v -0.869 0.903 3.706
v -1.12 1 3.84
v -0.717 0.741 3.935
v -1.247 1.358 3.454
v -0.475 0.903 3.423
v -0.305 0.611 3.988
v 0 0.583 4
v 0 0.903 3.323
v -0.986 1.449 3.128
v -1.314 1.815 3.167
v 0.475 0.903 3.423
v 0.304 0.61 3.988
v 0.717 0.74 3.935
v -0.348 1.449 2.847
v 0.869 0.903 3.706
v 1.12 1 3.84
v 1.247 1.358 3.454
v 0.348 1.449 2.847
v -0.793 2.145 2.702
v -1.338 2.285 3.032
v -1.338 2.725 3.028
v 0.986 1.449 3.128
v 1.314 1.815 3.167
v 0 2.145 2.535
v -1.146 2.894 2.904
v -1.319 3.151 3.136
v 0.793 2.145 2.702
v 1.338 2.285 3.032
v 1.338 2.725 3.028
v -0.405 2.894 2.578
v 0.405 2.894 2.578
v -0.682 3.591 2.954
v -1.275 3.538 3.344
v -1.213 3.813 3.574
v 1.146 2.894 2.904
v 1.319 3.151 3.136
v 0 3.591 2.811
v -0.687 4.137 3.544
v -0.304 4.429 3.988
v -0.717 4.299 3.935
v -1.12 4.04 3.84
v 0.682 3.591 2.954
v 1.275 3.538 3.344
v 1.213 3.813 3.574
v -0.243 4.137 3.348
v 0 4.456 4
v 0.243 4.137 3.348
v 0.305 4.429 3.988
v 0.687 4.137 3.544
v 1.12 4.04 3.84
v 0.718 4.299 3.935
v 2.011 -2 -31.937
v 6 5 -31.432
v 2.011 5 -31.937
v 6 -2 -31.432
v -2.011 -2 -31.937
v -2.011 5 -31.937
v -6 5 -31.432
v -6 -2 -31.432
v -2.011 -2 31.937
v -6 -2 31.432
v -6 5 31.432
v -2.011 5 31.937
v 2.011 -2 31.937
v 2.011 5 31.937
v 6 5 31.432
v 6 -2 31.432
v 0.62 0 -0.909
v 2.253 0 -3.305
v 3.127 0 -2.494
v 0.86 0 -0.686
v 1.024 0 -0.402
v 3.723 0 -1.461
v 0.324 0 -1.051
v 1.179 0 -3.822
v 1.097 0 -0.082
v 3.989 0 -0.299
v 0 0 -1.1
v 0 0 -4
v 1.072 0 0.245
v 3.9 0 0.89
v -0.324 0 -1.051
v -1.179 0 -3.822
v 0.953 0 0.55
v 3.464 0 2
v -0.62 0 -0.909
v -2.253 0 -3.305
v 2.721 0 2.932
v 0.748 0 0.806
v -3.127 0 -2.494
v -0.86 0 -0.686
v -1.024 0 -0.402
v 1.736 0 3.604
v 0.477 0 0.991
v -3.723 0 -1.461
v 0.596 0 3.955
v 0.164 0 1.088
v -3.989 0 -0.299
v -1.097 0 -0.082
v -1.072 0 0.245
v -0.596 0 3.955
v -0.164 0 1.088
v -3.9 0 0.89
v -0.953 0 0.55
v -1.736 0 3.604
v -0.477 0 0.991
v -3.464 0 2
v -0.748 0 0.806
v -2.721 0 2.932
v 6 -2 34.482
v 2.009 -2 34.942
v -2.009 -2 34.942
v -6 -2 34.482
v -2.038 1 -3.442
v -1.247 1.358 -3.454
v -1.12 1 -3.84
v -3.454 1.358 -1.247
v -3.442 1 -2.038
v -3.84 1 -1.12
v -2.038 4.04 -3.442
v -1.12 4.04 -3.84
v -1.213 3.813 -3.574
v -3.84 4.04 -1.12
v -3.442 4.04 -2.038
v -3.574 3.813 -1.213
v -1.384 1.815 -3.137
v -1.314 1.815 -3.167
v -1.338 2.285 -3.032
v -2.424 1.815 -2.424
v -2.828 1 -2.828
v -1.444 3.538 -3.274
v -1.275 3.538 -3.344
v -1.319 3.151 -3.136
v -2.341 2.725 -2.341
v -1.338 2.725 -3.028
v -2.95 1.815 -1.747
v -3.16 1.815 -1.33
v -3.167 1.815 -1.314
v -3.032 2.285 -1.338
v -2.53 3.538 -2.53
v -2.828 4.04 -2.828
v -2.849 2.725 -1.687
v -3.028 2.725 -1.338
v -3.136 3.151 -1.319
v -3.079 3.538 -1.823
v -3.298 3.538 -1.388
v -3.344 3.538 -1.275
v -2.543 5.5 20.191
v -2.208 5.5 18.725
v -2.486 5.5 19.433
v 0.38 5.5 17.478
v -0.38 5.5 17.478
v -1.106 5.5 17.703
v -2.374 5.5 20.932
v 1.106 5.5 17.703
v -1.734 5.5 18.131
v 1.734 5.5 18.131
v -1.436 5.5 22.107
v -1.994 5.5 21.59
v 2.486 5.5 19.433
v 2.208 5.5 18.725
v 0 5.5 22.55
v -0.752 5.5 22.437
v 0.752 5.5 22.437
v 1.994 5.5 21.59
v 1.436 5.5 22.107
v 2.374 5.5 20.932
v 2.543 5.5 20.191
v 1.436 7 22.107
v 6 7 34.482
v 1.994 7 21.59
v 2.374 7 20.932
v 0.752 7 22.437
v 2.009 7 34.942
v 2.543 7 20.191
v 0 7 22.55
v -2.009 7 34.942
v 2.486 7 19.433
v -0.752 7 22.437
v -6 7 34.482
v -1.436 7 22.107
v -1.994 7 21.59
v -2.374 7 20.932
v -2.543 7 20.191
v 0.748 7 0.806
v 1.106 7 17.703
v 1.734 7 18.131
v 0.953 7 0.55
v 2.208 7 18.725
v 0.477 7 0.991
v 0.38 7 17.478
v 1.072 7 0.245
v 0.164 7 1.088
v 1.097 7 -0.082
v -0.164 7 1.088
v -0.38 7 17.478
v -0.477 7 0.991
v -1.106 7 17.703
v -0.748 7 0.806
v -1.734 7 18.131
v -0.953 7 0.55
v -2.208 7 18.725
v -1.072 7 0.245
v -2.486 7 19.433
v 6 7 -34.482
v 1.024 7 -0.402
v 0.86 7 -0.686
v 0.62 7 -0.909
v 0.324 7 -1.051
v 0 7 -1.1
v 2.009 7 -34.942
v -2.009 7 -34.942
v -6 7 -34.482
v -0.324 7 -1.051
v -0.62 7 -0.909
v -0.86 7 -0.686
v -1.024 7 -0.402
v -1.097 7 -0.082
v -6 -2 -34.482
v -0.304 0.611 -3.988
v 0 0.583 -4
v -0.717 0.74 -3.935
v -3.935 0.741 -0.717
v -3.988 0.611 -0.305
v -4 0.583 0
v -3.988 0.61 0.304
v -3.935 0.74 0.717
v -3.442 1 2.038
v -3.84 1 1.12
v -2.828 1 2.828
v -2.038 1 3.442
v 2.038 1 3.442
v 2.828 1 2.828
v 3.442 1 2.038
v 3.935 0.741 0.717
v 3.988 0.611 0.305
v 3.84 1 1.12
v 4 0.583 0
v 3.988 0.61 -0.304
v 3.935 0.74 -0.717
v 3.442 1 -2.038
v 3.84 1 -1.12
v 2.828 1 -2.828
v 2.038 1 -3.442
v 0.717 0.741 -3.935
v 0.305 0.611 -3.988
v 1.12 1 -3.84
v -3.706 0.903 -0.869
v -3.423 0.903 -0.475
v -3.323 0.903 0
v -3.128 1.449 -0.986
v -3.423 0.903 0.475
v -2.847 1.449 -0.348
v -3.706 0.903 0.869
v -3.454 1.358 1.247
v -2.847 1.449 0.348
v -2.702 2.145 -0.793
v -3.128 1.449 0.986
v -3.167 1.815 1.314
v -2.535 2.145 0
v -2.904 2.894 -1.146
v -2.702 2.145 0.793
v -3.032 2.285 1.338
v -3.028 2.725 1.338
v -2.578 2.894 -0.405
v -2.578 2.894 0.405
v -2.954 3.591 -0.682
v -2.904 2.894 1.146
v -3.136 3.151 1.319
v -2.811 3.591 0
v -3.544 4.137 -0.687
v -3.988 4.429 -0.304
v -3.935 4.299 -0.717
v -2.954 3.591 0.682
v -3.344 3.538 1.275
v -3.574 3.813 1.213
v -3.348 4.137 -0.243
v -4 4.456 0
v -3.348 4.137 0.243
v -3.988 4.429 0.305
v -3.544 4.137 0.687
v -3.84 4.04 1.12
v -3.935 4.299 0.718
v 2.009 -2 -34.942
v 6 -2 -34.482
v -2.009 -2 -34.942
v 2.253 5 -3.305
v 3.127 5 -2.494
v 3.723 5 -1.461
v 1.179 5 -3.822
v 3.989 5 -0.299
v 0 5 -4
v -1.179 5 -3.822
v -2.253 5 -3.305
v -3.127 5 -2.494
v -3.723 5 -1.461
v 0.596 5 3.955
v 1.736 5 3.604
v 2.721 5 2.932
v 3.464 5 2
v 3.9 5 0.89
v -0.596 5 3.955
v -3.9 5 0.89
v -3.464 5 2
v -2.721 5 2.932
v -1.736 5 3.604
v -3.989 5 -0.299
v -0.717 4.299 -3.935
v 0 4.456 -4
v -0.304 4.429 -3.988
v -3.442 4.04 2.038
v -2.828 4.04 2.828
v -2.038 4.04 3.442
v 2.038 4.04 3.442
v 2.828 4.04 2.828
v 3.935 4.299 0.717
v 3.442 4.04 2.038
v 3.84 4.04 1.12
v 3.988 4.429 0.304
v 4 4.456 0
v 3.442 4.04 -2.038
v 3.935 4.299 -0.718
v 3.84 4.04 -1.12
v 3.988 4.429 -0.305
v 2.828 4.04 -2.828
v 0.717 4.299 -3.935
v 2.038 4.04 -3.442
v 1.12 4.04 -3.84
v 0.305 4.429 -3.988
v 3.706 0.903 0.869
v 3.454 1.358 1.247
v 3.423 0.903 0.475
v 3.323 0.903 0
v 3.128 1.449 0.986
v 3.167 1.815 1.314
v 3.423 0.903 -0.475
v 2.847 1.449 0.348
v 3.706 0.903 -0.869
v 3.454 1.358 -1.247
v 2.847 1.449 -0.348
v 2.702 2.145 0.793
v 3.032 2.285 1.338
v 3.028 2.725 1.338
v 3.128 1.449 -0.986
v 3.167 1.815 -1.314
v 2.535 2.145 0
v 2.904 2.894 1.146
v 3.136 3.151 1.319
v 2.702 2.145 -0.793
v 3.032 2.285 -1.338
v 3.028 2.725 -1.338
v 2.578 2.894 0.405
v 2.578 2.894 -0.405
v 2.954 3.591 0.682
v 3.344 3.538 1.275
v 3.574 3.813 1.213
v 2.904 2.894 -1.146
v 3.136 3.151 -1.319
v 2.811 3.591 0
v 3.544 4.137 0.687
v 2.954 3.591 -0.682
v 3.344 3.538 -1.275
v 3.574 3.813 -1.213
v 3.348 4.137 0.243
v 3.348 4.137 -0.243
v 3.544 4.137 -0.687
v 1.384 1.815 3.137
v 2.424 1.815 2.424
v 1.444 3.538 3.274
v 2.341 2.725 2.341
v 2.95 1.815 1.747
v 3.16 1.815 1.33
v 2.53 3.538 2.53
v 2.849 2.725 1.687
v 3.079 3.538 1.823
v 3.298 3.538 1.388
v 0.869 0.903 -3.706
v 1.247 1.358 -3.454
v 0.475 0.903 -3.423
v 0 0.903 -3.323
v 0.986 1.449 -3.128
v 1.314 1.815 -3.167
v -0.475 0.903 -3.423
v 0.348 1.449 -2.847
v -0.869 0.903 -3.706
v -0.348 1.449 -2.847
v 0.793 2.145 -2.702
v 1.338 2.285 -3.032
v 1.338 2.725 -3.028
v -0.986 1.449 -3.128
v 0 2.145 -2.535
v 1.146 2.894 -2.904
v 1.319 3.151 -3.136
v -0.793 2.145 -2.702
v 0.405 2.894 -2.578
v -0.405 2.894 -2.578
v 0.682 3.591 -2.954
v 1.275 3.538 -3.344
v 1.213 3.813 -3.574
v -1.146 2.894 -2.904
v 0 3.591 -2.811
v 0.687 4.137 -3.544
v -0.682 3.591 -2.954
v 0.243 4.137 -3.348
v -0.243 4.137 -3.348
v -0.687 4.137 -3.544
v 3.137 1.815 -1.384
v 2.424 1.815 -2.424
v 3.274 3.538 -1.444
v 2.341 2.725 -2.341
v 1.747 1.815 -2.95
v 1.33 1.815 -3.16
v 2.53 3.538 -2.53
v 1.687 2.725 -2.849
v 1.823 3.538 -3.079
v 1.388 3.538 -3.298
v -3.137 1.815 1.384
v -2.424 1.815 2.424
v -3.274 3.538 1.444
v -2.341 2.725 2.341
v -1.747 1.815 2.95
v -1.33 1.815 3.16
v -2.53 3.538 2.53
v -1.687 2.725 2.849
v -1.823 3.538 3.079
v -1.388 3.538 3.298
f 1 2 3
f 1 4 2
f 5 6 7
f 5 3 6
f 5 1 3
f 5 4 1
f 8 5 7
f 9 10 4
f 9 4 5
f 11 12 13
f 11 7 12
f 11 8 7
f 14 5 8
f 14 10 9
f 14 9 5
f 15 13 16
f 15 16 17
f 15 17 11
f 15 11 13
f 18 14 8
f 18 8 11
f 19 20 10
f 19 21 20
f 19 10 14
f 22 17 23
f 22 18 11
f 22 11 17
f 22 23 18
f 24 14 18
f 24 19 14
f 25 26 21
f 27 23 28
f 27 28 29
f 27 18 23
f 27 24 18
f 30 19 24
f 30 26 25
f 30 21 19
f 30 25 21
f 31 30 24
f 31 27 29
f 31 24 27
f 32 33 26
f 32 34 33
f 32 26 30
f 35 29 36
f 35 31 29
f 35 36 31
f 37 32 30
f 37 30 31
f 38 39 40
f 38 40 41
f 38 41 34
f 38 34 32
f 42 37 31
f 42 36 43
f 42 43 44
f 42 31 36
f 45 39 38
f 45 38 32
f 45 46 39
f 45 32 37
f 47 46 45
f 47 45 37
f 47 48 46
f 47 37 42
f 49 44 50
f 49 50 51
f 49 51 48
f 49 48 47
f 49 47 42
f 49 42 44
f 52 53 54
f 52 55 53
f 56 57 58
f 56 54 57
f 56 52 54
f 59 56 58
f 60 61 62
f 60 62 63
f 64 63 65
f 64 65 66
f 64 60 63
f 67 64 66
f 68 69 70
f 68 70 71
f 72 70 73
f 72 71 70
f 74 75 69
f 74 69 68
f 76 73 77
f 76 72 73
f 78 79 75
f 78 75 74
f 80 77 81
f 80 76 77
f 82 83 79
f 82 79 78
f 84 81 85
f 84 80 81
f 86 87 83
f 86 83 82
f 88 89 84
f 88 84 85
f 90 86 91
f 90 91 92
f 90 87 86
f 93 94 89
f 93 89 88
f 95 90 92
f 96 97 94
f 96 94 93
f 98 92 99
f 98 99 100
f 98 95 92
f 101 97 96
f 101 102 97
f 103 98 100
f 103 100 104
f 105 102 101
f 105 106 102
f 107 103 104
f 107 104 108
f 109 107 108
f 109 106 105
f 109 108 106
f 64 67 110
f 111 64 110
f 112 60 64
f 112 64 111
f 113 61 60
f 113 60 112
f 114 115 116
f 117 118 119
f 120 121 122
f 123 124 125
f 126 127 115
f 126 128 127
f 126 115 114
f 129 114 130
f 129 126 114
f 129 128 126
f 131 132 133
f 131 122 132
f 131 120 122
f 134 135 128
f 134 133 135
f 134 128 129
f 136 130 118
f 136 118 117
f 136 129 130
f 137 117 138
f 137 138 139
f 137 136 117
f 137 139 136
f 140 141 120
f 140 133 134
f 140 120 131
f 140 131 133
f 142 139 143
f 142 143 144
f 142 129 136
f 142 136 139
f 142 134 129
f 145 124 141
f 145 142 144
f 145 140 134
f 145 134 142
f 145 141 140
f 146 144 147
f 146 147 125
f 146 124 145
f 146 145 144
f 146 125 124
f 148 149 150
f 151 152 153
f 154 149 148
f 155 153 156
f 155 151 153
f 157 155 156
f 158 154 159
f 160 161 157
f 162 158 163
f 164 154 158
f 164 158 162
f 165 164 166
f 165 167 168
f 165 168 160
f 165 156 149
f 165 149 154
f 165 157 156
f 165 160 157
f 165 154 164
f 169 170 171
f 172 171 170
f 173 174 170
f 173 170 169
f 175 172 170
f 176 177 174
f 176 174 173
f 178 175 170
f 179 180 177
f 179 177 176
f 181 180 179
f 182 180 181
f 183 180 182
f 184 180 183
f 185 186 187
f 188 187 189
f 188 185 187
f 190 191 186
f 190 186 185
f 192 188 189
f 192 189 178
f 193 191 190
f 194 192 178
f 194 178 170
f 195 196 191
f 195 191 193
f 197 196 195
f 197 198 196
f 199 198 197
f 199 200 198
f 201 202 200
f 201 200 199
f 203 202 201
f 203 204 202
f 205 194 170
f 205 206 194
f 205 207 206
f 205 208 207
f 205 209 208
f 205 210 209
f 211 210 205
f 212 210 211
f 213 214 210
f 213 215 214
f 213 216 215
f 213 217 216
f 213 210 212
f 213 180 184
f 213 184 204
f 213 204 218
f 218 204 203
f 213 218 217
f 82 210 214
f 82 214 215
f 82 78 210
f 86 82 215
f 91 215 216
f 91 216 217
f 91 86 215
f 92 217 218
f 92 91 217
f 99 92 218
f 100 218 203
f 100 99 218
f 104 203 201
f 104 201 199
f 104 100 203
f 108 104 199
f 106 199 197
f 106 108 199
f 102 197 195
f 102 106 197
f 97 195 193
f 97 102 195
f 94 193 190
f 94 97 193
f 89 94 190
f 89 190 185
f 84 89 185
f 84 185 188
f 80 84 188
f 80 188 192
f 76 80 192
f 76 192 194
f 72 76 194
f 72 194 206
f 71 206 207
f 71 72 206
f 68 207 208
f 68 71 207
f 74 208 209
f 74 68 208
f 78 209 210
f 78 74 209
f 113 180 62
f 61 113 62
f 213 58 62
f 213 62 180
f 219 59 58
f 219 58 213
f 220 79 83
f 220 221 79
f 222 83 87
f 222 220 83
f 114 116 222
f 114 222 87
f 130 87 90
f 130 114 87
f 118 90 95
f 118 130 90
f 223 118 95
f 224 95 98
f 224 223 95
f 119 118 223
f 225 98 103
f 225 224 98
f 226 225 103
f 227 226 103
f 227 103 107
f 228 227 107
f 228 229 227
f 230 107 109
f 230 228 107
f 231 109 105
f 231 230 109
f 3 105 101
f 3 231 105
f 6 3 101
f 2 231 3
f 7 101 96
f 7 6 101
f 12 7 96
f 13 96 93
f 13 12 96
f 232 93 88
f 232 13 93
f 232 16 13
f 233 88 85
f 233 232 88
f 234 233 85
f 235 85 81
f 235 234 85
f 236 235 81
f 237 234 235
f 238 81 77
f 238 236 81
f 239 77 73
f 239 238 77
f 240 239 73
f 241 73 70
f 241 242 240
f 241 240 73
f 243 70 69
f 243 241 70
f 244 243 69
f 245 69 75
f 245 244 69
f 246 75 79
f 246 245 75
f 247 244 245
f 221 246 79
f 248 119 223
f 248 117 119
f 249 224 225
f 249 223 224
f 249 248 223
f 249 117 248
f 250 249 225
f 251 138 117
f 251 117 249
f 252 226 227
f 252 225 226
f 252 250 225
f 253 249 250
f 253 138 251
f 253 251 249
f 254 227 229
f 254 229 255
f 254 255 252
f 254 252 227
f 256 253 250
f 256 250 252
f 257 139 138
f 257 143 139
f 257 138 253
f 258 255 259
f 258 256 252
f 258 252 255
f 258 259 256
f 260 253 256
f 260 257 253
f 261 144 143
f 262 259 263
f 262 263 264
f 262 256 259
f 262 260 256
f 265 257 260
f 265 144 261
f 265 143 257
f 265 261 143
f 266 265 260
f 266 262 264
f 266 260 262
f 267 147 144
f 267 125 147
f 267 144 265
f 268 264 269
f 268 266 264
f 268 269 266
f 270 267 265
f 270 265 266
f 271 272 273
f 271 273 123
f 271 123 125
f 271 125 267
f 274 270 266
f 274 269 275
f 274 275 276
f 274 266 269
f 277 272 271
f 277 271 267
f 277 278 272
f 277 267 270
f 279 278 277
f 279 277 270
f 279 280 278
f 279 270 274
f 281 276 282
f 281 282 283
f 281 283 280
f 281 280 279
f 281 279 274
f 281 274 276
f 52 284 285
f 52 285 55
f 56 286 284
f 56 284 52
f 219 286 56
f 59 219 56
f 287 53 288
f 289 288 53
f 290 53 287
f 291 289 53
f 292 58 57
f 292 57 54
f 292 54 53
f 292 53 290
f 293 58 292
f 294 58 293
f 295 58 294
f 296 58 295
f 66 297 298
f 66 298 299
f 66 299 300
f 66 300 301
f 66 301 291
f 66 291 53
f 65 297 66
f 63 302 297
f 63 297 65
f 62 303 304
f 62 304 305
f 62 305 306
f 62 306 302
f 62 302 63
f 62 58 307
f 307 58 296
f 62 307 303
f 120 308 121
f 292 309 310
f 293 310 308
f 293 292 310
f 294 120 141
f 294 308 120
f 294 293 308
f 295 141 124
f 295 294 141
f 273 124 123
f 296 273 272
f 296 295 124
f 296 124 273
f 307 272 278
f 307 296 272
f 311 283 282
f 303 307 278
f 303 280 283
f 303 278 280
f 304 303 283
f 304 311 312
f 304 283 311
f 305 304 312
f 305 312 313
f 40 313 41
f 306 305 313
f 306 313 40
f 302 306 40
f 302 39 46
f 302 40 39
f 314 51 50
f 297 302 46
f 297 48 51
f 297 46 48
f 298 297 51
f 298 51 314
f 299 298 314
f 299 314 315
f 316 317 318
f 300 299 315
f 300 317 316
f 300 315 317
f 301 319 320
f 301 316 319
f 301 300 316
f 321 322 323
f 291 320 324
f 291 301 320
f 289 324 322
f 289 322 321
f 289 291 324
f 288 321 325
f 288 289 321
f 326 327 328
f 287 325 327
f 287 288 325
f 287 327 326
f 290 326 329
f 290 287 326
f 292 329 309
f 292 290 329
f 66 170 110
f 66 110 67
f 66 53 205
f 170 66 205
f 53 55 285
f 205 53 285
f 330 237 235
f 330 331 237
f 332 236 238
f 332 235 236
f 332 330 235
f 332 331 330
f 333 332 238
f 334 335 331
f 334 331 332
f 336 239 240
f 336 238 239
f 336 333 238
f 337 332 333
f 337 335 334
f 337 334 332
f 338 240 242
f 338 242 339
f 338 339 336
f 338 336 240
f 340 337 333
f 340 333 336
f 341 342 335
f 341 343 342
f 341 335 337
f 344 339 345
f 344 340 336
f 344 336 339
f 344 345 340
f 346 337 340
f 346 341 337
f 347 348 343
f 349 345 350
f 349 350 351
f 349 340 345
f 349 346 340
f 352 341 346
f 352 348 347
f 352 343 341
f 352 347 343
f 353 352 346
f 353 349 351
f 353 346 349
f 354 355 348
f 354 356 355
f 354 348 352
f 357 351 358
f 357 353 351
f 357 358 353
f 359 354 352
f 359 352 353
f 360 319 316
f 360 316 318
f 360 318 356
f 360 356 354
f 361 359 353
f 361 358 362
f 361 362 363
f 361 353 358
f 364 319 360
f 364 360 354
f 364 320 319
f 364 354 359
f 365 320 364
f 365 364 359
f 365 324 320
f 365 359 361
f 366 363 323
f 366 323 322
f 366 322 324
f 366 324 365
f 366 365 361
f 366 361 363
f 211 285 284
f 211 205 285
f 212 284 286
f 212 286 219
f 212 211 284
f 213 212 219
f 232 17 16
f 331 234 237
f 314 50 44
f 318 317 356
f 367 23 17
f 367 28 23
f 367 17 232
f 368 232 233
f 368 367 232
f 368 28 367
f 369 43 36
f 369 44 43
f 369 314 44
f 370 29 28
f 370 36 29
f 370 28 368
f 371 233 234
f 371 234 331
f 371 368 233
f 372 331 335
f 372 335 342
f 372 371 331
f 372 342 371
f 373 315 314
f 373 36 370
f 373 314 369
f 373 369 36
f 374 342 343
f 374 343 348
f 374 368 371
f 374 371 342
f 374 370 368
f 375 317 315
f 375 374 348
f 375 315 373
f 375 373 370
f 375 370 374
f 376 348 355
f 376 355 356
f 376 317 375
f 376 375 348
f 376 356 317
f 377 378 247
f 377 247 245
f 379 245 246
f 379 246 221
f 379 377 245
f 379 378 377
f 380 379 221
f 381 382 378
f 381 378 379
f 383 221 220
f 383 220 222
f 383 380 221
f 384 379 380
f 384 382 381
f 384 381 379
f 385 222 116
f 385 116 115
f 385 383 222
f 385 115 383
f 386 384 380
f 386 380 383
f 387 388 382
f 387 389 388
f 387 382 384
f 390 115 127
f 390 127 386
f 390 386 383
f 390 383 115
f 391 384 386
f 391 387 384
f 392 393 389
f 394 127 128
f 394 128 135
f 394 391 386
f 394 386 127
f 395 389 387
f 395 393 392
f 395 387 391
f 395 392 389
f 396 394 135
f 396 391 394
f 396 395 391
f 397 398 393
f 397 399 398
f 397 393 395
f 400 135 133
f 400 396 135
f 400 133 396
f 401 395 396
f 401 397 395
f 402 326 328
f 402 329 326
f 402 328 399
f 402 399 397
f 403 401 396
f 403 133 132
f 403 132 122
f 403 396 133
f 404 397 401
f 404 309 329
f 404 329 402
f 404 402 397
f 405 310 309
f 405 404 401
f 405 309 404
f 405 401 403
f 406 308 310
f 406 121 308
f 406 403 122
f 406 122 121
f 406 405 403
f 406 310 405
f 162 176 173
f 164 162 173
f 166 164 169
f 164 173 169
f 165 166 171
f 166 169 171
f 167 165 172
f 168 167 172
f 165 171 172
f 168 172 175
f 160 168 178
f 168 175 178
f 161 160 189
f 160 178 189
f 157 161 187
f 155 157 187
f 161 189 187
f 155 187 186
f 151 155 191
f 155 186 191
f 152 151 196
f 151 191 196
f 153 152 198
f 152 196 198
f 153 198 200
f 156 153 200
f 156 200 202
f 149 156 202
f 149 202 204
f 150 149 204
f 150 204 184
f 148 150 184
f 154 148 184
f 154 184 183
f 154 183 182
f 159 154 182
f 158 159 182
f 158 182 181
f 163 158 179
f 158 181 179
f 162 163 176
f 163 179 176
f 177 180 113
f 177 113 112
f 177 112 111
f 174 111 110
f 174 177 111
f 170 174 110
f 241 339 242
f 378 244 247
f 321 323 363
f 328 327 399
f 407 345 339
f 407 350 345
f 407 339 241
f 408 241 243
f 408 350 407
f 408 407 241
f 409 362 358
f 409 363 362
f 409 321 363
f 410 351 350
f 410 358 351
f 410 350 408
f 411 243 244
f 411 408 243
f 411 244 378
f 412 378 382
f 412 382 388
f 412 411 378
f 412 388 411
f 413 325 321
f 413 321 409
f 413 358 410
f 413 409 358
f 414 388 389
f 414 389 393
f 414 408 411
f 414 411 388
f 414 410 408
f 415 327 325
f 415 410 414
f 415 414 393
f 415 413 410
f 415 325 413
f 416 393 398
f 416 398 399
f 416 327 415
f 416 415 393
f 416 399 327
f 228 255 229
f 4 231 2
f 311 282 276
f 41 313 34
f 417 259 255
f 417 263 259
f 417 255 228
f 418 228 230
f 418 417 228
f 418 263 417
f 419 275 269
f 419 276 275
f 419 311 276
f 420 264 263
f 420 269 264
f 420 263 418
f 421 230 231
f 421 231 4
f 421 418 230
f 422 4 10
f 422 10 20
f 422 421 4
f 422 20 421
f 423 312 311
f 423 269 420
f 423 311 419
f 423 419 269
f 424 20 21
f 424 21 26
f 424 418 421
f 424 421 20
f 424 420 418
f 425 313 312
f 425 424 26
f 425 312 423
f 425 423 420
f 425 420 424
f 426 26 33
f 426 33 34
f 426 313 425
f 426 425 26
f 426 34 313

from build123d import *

# Parameters (mm, degrees)
CORTE_EXTRUS_O1_DEPTH      = 51.309044912
CORTE_EXTRUS_O1_DEPTH_BACK = 51.309044912
ESBO_O2_W                  = 96.741183006
ESBO_O2_H                  = 102.357875962
ESBO_O2_W_2                = 12
ESBO_O2_H_2                = 76.270119436
PADR_OCIRCULAR1_COUNT      = 4
ESBO_O4_R                  = 2.55
CORTE_EXTRUS_O2_DEPTH      = 1.5


with BuildPart() as part:
    # Esboço1 → Revolução1 (revolve)
    with BuildSketch(Plane.XY, mode=Mode.PRIVATE) as revolu_o1_sk:
        with BuildLine():
            Line((1.1, 7), (1.1, 0))
            Line((1.1, 0), (4, 0))
            Line((4, 0), (4, 1))
            ThreePointArc((4, 1), (3.3, 2.519868415), (4, 4.039736831))
            Line((4, 4.039736831), (4, 5))
            Line((4, 5), (32, 5))
            Line((32, 5), (32, -2))
            Line((32, -2), (35, -2))
            Line((35, -2), (35, 7))
            Line((35, 7), (3.5, 7))
            Line((3.5, 7), (1.1, 7))
        make_face()
    revolve(revolu_o1_sk.sketch.rotate(Axis((0, 0, 0), (0, 1, 0)), 90), axis=Axis((0, 0, 0), (0, 1, 0)))

    # Esboço2 → Corte-extrusão1 (cut, two sides: drawn at the far end of the back side and taken through both)
    with BuildSketch(Plane(origin=(0, 7, 0), x_dir=(1, 0, 0), z_dir=(0, 1, 0)).offset(-CORTE_EXTRUS_O1_DEPTH_BACK)):
        Rectangle(ESBO_O2_W, ESBO_O2_H)
        Rectangle(ESBO_O2_W_2, ESBO_O2_H_2, mode=Mode.SUBTRACT)
    extrude(amount=CORTE_EXTRUS_O1_DEPTH + CORTE_EXTRUS_O1_DEPTH_BACK, mode=Mode.SUBTRACT)

    # Esboço3 → Corte-Revolução1 (revolve, cut)
    with BuildSketch(Plane.XY):
        with BuildLine():
            Line((4.5, 4.519868415), (4.5, 0.519868415))
            ThreePointArc((4.5, 0.519868415), (2.5, 2.519868415), (4.5, 4.519868415))
        make_face()
    corte_revolu_o1 = revolve(axis=Axis((4.5, 4.519868415, 0), (0, -1, 0)), mode=Mode.SUBTRACT)

    # PadrãoCircular1: Corte-Revolução1 ×4 about axis
    padr_ocircular1_axis = Axis((0, 0, 0), (0, 1, 0))
    for i in range(1, PADR_OCIRCULAR1_COUNT):
        add(corte_revolu_o1.rotate(padr_ocircular1_axis, i * 360 / PADR_OCIRCULAR1_COUNT), mode=Mode.SUBTRACT)

    # Esboço4 → Corte-extrusão2 (cut)
    with BuildSketch(Plane(origin=(0, 7, 0), x_dir=(1, 0, 0), z_dir=(0, 1, 0))):
        with Locations(Location((0, -20, 0), (0, 0, 270))):
            Circle(ESBO_O4_R)
    extrude(amount=-CORTE_EXTRUS_O2_DEPTH, mode=Mode.SUBTRACT)


solid = part.part
